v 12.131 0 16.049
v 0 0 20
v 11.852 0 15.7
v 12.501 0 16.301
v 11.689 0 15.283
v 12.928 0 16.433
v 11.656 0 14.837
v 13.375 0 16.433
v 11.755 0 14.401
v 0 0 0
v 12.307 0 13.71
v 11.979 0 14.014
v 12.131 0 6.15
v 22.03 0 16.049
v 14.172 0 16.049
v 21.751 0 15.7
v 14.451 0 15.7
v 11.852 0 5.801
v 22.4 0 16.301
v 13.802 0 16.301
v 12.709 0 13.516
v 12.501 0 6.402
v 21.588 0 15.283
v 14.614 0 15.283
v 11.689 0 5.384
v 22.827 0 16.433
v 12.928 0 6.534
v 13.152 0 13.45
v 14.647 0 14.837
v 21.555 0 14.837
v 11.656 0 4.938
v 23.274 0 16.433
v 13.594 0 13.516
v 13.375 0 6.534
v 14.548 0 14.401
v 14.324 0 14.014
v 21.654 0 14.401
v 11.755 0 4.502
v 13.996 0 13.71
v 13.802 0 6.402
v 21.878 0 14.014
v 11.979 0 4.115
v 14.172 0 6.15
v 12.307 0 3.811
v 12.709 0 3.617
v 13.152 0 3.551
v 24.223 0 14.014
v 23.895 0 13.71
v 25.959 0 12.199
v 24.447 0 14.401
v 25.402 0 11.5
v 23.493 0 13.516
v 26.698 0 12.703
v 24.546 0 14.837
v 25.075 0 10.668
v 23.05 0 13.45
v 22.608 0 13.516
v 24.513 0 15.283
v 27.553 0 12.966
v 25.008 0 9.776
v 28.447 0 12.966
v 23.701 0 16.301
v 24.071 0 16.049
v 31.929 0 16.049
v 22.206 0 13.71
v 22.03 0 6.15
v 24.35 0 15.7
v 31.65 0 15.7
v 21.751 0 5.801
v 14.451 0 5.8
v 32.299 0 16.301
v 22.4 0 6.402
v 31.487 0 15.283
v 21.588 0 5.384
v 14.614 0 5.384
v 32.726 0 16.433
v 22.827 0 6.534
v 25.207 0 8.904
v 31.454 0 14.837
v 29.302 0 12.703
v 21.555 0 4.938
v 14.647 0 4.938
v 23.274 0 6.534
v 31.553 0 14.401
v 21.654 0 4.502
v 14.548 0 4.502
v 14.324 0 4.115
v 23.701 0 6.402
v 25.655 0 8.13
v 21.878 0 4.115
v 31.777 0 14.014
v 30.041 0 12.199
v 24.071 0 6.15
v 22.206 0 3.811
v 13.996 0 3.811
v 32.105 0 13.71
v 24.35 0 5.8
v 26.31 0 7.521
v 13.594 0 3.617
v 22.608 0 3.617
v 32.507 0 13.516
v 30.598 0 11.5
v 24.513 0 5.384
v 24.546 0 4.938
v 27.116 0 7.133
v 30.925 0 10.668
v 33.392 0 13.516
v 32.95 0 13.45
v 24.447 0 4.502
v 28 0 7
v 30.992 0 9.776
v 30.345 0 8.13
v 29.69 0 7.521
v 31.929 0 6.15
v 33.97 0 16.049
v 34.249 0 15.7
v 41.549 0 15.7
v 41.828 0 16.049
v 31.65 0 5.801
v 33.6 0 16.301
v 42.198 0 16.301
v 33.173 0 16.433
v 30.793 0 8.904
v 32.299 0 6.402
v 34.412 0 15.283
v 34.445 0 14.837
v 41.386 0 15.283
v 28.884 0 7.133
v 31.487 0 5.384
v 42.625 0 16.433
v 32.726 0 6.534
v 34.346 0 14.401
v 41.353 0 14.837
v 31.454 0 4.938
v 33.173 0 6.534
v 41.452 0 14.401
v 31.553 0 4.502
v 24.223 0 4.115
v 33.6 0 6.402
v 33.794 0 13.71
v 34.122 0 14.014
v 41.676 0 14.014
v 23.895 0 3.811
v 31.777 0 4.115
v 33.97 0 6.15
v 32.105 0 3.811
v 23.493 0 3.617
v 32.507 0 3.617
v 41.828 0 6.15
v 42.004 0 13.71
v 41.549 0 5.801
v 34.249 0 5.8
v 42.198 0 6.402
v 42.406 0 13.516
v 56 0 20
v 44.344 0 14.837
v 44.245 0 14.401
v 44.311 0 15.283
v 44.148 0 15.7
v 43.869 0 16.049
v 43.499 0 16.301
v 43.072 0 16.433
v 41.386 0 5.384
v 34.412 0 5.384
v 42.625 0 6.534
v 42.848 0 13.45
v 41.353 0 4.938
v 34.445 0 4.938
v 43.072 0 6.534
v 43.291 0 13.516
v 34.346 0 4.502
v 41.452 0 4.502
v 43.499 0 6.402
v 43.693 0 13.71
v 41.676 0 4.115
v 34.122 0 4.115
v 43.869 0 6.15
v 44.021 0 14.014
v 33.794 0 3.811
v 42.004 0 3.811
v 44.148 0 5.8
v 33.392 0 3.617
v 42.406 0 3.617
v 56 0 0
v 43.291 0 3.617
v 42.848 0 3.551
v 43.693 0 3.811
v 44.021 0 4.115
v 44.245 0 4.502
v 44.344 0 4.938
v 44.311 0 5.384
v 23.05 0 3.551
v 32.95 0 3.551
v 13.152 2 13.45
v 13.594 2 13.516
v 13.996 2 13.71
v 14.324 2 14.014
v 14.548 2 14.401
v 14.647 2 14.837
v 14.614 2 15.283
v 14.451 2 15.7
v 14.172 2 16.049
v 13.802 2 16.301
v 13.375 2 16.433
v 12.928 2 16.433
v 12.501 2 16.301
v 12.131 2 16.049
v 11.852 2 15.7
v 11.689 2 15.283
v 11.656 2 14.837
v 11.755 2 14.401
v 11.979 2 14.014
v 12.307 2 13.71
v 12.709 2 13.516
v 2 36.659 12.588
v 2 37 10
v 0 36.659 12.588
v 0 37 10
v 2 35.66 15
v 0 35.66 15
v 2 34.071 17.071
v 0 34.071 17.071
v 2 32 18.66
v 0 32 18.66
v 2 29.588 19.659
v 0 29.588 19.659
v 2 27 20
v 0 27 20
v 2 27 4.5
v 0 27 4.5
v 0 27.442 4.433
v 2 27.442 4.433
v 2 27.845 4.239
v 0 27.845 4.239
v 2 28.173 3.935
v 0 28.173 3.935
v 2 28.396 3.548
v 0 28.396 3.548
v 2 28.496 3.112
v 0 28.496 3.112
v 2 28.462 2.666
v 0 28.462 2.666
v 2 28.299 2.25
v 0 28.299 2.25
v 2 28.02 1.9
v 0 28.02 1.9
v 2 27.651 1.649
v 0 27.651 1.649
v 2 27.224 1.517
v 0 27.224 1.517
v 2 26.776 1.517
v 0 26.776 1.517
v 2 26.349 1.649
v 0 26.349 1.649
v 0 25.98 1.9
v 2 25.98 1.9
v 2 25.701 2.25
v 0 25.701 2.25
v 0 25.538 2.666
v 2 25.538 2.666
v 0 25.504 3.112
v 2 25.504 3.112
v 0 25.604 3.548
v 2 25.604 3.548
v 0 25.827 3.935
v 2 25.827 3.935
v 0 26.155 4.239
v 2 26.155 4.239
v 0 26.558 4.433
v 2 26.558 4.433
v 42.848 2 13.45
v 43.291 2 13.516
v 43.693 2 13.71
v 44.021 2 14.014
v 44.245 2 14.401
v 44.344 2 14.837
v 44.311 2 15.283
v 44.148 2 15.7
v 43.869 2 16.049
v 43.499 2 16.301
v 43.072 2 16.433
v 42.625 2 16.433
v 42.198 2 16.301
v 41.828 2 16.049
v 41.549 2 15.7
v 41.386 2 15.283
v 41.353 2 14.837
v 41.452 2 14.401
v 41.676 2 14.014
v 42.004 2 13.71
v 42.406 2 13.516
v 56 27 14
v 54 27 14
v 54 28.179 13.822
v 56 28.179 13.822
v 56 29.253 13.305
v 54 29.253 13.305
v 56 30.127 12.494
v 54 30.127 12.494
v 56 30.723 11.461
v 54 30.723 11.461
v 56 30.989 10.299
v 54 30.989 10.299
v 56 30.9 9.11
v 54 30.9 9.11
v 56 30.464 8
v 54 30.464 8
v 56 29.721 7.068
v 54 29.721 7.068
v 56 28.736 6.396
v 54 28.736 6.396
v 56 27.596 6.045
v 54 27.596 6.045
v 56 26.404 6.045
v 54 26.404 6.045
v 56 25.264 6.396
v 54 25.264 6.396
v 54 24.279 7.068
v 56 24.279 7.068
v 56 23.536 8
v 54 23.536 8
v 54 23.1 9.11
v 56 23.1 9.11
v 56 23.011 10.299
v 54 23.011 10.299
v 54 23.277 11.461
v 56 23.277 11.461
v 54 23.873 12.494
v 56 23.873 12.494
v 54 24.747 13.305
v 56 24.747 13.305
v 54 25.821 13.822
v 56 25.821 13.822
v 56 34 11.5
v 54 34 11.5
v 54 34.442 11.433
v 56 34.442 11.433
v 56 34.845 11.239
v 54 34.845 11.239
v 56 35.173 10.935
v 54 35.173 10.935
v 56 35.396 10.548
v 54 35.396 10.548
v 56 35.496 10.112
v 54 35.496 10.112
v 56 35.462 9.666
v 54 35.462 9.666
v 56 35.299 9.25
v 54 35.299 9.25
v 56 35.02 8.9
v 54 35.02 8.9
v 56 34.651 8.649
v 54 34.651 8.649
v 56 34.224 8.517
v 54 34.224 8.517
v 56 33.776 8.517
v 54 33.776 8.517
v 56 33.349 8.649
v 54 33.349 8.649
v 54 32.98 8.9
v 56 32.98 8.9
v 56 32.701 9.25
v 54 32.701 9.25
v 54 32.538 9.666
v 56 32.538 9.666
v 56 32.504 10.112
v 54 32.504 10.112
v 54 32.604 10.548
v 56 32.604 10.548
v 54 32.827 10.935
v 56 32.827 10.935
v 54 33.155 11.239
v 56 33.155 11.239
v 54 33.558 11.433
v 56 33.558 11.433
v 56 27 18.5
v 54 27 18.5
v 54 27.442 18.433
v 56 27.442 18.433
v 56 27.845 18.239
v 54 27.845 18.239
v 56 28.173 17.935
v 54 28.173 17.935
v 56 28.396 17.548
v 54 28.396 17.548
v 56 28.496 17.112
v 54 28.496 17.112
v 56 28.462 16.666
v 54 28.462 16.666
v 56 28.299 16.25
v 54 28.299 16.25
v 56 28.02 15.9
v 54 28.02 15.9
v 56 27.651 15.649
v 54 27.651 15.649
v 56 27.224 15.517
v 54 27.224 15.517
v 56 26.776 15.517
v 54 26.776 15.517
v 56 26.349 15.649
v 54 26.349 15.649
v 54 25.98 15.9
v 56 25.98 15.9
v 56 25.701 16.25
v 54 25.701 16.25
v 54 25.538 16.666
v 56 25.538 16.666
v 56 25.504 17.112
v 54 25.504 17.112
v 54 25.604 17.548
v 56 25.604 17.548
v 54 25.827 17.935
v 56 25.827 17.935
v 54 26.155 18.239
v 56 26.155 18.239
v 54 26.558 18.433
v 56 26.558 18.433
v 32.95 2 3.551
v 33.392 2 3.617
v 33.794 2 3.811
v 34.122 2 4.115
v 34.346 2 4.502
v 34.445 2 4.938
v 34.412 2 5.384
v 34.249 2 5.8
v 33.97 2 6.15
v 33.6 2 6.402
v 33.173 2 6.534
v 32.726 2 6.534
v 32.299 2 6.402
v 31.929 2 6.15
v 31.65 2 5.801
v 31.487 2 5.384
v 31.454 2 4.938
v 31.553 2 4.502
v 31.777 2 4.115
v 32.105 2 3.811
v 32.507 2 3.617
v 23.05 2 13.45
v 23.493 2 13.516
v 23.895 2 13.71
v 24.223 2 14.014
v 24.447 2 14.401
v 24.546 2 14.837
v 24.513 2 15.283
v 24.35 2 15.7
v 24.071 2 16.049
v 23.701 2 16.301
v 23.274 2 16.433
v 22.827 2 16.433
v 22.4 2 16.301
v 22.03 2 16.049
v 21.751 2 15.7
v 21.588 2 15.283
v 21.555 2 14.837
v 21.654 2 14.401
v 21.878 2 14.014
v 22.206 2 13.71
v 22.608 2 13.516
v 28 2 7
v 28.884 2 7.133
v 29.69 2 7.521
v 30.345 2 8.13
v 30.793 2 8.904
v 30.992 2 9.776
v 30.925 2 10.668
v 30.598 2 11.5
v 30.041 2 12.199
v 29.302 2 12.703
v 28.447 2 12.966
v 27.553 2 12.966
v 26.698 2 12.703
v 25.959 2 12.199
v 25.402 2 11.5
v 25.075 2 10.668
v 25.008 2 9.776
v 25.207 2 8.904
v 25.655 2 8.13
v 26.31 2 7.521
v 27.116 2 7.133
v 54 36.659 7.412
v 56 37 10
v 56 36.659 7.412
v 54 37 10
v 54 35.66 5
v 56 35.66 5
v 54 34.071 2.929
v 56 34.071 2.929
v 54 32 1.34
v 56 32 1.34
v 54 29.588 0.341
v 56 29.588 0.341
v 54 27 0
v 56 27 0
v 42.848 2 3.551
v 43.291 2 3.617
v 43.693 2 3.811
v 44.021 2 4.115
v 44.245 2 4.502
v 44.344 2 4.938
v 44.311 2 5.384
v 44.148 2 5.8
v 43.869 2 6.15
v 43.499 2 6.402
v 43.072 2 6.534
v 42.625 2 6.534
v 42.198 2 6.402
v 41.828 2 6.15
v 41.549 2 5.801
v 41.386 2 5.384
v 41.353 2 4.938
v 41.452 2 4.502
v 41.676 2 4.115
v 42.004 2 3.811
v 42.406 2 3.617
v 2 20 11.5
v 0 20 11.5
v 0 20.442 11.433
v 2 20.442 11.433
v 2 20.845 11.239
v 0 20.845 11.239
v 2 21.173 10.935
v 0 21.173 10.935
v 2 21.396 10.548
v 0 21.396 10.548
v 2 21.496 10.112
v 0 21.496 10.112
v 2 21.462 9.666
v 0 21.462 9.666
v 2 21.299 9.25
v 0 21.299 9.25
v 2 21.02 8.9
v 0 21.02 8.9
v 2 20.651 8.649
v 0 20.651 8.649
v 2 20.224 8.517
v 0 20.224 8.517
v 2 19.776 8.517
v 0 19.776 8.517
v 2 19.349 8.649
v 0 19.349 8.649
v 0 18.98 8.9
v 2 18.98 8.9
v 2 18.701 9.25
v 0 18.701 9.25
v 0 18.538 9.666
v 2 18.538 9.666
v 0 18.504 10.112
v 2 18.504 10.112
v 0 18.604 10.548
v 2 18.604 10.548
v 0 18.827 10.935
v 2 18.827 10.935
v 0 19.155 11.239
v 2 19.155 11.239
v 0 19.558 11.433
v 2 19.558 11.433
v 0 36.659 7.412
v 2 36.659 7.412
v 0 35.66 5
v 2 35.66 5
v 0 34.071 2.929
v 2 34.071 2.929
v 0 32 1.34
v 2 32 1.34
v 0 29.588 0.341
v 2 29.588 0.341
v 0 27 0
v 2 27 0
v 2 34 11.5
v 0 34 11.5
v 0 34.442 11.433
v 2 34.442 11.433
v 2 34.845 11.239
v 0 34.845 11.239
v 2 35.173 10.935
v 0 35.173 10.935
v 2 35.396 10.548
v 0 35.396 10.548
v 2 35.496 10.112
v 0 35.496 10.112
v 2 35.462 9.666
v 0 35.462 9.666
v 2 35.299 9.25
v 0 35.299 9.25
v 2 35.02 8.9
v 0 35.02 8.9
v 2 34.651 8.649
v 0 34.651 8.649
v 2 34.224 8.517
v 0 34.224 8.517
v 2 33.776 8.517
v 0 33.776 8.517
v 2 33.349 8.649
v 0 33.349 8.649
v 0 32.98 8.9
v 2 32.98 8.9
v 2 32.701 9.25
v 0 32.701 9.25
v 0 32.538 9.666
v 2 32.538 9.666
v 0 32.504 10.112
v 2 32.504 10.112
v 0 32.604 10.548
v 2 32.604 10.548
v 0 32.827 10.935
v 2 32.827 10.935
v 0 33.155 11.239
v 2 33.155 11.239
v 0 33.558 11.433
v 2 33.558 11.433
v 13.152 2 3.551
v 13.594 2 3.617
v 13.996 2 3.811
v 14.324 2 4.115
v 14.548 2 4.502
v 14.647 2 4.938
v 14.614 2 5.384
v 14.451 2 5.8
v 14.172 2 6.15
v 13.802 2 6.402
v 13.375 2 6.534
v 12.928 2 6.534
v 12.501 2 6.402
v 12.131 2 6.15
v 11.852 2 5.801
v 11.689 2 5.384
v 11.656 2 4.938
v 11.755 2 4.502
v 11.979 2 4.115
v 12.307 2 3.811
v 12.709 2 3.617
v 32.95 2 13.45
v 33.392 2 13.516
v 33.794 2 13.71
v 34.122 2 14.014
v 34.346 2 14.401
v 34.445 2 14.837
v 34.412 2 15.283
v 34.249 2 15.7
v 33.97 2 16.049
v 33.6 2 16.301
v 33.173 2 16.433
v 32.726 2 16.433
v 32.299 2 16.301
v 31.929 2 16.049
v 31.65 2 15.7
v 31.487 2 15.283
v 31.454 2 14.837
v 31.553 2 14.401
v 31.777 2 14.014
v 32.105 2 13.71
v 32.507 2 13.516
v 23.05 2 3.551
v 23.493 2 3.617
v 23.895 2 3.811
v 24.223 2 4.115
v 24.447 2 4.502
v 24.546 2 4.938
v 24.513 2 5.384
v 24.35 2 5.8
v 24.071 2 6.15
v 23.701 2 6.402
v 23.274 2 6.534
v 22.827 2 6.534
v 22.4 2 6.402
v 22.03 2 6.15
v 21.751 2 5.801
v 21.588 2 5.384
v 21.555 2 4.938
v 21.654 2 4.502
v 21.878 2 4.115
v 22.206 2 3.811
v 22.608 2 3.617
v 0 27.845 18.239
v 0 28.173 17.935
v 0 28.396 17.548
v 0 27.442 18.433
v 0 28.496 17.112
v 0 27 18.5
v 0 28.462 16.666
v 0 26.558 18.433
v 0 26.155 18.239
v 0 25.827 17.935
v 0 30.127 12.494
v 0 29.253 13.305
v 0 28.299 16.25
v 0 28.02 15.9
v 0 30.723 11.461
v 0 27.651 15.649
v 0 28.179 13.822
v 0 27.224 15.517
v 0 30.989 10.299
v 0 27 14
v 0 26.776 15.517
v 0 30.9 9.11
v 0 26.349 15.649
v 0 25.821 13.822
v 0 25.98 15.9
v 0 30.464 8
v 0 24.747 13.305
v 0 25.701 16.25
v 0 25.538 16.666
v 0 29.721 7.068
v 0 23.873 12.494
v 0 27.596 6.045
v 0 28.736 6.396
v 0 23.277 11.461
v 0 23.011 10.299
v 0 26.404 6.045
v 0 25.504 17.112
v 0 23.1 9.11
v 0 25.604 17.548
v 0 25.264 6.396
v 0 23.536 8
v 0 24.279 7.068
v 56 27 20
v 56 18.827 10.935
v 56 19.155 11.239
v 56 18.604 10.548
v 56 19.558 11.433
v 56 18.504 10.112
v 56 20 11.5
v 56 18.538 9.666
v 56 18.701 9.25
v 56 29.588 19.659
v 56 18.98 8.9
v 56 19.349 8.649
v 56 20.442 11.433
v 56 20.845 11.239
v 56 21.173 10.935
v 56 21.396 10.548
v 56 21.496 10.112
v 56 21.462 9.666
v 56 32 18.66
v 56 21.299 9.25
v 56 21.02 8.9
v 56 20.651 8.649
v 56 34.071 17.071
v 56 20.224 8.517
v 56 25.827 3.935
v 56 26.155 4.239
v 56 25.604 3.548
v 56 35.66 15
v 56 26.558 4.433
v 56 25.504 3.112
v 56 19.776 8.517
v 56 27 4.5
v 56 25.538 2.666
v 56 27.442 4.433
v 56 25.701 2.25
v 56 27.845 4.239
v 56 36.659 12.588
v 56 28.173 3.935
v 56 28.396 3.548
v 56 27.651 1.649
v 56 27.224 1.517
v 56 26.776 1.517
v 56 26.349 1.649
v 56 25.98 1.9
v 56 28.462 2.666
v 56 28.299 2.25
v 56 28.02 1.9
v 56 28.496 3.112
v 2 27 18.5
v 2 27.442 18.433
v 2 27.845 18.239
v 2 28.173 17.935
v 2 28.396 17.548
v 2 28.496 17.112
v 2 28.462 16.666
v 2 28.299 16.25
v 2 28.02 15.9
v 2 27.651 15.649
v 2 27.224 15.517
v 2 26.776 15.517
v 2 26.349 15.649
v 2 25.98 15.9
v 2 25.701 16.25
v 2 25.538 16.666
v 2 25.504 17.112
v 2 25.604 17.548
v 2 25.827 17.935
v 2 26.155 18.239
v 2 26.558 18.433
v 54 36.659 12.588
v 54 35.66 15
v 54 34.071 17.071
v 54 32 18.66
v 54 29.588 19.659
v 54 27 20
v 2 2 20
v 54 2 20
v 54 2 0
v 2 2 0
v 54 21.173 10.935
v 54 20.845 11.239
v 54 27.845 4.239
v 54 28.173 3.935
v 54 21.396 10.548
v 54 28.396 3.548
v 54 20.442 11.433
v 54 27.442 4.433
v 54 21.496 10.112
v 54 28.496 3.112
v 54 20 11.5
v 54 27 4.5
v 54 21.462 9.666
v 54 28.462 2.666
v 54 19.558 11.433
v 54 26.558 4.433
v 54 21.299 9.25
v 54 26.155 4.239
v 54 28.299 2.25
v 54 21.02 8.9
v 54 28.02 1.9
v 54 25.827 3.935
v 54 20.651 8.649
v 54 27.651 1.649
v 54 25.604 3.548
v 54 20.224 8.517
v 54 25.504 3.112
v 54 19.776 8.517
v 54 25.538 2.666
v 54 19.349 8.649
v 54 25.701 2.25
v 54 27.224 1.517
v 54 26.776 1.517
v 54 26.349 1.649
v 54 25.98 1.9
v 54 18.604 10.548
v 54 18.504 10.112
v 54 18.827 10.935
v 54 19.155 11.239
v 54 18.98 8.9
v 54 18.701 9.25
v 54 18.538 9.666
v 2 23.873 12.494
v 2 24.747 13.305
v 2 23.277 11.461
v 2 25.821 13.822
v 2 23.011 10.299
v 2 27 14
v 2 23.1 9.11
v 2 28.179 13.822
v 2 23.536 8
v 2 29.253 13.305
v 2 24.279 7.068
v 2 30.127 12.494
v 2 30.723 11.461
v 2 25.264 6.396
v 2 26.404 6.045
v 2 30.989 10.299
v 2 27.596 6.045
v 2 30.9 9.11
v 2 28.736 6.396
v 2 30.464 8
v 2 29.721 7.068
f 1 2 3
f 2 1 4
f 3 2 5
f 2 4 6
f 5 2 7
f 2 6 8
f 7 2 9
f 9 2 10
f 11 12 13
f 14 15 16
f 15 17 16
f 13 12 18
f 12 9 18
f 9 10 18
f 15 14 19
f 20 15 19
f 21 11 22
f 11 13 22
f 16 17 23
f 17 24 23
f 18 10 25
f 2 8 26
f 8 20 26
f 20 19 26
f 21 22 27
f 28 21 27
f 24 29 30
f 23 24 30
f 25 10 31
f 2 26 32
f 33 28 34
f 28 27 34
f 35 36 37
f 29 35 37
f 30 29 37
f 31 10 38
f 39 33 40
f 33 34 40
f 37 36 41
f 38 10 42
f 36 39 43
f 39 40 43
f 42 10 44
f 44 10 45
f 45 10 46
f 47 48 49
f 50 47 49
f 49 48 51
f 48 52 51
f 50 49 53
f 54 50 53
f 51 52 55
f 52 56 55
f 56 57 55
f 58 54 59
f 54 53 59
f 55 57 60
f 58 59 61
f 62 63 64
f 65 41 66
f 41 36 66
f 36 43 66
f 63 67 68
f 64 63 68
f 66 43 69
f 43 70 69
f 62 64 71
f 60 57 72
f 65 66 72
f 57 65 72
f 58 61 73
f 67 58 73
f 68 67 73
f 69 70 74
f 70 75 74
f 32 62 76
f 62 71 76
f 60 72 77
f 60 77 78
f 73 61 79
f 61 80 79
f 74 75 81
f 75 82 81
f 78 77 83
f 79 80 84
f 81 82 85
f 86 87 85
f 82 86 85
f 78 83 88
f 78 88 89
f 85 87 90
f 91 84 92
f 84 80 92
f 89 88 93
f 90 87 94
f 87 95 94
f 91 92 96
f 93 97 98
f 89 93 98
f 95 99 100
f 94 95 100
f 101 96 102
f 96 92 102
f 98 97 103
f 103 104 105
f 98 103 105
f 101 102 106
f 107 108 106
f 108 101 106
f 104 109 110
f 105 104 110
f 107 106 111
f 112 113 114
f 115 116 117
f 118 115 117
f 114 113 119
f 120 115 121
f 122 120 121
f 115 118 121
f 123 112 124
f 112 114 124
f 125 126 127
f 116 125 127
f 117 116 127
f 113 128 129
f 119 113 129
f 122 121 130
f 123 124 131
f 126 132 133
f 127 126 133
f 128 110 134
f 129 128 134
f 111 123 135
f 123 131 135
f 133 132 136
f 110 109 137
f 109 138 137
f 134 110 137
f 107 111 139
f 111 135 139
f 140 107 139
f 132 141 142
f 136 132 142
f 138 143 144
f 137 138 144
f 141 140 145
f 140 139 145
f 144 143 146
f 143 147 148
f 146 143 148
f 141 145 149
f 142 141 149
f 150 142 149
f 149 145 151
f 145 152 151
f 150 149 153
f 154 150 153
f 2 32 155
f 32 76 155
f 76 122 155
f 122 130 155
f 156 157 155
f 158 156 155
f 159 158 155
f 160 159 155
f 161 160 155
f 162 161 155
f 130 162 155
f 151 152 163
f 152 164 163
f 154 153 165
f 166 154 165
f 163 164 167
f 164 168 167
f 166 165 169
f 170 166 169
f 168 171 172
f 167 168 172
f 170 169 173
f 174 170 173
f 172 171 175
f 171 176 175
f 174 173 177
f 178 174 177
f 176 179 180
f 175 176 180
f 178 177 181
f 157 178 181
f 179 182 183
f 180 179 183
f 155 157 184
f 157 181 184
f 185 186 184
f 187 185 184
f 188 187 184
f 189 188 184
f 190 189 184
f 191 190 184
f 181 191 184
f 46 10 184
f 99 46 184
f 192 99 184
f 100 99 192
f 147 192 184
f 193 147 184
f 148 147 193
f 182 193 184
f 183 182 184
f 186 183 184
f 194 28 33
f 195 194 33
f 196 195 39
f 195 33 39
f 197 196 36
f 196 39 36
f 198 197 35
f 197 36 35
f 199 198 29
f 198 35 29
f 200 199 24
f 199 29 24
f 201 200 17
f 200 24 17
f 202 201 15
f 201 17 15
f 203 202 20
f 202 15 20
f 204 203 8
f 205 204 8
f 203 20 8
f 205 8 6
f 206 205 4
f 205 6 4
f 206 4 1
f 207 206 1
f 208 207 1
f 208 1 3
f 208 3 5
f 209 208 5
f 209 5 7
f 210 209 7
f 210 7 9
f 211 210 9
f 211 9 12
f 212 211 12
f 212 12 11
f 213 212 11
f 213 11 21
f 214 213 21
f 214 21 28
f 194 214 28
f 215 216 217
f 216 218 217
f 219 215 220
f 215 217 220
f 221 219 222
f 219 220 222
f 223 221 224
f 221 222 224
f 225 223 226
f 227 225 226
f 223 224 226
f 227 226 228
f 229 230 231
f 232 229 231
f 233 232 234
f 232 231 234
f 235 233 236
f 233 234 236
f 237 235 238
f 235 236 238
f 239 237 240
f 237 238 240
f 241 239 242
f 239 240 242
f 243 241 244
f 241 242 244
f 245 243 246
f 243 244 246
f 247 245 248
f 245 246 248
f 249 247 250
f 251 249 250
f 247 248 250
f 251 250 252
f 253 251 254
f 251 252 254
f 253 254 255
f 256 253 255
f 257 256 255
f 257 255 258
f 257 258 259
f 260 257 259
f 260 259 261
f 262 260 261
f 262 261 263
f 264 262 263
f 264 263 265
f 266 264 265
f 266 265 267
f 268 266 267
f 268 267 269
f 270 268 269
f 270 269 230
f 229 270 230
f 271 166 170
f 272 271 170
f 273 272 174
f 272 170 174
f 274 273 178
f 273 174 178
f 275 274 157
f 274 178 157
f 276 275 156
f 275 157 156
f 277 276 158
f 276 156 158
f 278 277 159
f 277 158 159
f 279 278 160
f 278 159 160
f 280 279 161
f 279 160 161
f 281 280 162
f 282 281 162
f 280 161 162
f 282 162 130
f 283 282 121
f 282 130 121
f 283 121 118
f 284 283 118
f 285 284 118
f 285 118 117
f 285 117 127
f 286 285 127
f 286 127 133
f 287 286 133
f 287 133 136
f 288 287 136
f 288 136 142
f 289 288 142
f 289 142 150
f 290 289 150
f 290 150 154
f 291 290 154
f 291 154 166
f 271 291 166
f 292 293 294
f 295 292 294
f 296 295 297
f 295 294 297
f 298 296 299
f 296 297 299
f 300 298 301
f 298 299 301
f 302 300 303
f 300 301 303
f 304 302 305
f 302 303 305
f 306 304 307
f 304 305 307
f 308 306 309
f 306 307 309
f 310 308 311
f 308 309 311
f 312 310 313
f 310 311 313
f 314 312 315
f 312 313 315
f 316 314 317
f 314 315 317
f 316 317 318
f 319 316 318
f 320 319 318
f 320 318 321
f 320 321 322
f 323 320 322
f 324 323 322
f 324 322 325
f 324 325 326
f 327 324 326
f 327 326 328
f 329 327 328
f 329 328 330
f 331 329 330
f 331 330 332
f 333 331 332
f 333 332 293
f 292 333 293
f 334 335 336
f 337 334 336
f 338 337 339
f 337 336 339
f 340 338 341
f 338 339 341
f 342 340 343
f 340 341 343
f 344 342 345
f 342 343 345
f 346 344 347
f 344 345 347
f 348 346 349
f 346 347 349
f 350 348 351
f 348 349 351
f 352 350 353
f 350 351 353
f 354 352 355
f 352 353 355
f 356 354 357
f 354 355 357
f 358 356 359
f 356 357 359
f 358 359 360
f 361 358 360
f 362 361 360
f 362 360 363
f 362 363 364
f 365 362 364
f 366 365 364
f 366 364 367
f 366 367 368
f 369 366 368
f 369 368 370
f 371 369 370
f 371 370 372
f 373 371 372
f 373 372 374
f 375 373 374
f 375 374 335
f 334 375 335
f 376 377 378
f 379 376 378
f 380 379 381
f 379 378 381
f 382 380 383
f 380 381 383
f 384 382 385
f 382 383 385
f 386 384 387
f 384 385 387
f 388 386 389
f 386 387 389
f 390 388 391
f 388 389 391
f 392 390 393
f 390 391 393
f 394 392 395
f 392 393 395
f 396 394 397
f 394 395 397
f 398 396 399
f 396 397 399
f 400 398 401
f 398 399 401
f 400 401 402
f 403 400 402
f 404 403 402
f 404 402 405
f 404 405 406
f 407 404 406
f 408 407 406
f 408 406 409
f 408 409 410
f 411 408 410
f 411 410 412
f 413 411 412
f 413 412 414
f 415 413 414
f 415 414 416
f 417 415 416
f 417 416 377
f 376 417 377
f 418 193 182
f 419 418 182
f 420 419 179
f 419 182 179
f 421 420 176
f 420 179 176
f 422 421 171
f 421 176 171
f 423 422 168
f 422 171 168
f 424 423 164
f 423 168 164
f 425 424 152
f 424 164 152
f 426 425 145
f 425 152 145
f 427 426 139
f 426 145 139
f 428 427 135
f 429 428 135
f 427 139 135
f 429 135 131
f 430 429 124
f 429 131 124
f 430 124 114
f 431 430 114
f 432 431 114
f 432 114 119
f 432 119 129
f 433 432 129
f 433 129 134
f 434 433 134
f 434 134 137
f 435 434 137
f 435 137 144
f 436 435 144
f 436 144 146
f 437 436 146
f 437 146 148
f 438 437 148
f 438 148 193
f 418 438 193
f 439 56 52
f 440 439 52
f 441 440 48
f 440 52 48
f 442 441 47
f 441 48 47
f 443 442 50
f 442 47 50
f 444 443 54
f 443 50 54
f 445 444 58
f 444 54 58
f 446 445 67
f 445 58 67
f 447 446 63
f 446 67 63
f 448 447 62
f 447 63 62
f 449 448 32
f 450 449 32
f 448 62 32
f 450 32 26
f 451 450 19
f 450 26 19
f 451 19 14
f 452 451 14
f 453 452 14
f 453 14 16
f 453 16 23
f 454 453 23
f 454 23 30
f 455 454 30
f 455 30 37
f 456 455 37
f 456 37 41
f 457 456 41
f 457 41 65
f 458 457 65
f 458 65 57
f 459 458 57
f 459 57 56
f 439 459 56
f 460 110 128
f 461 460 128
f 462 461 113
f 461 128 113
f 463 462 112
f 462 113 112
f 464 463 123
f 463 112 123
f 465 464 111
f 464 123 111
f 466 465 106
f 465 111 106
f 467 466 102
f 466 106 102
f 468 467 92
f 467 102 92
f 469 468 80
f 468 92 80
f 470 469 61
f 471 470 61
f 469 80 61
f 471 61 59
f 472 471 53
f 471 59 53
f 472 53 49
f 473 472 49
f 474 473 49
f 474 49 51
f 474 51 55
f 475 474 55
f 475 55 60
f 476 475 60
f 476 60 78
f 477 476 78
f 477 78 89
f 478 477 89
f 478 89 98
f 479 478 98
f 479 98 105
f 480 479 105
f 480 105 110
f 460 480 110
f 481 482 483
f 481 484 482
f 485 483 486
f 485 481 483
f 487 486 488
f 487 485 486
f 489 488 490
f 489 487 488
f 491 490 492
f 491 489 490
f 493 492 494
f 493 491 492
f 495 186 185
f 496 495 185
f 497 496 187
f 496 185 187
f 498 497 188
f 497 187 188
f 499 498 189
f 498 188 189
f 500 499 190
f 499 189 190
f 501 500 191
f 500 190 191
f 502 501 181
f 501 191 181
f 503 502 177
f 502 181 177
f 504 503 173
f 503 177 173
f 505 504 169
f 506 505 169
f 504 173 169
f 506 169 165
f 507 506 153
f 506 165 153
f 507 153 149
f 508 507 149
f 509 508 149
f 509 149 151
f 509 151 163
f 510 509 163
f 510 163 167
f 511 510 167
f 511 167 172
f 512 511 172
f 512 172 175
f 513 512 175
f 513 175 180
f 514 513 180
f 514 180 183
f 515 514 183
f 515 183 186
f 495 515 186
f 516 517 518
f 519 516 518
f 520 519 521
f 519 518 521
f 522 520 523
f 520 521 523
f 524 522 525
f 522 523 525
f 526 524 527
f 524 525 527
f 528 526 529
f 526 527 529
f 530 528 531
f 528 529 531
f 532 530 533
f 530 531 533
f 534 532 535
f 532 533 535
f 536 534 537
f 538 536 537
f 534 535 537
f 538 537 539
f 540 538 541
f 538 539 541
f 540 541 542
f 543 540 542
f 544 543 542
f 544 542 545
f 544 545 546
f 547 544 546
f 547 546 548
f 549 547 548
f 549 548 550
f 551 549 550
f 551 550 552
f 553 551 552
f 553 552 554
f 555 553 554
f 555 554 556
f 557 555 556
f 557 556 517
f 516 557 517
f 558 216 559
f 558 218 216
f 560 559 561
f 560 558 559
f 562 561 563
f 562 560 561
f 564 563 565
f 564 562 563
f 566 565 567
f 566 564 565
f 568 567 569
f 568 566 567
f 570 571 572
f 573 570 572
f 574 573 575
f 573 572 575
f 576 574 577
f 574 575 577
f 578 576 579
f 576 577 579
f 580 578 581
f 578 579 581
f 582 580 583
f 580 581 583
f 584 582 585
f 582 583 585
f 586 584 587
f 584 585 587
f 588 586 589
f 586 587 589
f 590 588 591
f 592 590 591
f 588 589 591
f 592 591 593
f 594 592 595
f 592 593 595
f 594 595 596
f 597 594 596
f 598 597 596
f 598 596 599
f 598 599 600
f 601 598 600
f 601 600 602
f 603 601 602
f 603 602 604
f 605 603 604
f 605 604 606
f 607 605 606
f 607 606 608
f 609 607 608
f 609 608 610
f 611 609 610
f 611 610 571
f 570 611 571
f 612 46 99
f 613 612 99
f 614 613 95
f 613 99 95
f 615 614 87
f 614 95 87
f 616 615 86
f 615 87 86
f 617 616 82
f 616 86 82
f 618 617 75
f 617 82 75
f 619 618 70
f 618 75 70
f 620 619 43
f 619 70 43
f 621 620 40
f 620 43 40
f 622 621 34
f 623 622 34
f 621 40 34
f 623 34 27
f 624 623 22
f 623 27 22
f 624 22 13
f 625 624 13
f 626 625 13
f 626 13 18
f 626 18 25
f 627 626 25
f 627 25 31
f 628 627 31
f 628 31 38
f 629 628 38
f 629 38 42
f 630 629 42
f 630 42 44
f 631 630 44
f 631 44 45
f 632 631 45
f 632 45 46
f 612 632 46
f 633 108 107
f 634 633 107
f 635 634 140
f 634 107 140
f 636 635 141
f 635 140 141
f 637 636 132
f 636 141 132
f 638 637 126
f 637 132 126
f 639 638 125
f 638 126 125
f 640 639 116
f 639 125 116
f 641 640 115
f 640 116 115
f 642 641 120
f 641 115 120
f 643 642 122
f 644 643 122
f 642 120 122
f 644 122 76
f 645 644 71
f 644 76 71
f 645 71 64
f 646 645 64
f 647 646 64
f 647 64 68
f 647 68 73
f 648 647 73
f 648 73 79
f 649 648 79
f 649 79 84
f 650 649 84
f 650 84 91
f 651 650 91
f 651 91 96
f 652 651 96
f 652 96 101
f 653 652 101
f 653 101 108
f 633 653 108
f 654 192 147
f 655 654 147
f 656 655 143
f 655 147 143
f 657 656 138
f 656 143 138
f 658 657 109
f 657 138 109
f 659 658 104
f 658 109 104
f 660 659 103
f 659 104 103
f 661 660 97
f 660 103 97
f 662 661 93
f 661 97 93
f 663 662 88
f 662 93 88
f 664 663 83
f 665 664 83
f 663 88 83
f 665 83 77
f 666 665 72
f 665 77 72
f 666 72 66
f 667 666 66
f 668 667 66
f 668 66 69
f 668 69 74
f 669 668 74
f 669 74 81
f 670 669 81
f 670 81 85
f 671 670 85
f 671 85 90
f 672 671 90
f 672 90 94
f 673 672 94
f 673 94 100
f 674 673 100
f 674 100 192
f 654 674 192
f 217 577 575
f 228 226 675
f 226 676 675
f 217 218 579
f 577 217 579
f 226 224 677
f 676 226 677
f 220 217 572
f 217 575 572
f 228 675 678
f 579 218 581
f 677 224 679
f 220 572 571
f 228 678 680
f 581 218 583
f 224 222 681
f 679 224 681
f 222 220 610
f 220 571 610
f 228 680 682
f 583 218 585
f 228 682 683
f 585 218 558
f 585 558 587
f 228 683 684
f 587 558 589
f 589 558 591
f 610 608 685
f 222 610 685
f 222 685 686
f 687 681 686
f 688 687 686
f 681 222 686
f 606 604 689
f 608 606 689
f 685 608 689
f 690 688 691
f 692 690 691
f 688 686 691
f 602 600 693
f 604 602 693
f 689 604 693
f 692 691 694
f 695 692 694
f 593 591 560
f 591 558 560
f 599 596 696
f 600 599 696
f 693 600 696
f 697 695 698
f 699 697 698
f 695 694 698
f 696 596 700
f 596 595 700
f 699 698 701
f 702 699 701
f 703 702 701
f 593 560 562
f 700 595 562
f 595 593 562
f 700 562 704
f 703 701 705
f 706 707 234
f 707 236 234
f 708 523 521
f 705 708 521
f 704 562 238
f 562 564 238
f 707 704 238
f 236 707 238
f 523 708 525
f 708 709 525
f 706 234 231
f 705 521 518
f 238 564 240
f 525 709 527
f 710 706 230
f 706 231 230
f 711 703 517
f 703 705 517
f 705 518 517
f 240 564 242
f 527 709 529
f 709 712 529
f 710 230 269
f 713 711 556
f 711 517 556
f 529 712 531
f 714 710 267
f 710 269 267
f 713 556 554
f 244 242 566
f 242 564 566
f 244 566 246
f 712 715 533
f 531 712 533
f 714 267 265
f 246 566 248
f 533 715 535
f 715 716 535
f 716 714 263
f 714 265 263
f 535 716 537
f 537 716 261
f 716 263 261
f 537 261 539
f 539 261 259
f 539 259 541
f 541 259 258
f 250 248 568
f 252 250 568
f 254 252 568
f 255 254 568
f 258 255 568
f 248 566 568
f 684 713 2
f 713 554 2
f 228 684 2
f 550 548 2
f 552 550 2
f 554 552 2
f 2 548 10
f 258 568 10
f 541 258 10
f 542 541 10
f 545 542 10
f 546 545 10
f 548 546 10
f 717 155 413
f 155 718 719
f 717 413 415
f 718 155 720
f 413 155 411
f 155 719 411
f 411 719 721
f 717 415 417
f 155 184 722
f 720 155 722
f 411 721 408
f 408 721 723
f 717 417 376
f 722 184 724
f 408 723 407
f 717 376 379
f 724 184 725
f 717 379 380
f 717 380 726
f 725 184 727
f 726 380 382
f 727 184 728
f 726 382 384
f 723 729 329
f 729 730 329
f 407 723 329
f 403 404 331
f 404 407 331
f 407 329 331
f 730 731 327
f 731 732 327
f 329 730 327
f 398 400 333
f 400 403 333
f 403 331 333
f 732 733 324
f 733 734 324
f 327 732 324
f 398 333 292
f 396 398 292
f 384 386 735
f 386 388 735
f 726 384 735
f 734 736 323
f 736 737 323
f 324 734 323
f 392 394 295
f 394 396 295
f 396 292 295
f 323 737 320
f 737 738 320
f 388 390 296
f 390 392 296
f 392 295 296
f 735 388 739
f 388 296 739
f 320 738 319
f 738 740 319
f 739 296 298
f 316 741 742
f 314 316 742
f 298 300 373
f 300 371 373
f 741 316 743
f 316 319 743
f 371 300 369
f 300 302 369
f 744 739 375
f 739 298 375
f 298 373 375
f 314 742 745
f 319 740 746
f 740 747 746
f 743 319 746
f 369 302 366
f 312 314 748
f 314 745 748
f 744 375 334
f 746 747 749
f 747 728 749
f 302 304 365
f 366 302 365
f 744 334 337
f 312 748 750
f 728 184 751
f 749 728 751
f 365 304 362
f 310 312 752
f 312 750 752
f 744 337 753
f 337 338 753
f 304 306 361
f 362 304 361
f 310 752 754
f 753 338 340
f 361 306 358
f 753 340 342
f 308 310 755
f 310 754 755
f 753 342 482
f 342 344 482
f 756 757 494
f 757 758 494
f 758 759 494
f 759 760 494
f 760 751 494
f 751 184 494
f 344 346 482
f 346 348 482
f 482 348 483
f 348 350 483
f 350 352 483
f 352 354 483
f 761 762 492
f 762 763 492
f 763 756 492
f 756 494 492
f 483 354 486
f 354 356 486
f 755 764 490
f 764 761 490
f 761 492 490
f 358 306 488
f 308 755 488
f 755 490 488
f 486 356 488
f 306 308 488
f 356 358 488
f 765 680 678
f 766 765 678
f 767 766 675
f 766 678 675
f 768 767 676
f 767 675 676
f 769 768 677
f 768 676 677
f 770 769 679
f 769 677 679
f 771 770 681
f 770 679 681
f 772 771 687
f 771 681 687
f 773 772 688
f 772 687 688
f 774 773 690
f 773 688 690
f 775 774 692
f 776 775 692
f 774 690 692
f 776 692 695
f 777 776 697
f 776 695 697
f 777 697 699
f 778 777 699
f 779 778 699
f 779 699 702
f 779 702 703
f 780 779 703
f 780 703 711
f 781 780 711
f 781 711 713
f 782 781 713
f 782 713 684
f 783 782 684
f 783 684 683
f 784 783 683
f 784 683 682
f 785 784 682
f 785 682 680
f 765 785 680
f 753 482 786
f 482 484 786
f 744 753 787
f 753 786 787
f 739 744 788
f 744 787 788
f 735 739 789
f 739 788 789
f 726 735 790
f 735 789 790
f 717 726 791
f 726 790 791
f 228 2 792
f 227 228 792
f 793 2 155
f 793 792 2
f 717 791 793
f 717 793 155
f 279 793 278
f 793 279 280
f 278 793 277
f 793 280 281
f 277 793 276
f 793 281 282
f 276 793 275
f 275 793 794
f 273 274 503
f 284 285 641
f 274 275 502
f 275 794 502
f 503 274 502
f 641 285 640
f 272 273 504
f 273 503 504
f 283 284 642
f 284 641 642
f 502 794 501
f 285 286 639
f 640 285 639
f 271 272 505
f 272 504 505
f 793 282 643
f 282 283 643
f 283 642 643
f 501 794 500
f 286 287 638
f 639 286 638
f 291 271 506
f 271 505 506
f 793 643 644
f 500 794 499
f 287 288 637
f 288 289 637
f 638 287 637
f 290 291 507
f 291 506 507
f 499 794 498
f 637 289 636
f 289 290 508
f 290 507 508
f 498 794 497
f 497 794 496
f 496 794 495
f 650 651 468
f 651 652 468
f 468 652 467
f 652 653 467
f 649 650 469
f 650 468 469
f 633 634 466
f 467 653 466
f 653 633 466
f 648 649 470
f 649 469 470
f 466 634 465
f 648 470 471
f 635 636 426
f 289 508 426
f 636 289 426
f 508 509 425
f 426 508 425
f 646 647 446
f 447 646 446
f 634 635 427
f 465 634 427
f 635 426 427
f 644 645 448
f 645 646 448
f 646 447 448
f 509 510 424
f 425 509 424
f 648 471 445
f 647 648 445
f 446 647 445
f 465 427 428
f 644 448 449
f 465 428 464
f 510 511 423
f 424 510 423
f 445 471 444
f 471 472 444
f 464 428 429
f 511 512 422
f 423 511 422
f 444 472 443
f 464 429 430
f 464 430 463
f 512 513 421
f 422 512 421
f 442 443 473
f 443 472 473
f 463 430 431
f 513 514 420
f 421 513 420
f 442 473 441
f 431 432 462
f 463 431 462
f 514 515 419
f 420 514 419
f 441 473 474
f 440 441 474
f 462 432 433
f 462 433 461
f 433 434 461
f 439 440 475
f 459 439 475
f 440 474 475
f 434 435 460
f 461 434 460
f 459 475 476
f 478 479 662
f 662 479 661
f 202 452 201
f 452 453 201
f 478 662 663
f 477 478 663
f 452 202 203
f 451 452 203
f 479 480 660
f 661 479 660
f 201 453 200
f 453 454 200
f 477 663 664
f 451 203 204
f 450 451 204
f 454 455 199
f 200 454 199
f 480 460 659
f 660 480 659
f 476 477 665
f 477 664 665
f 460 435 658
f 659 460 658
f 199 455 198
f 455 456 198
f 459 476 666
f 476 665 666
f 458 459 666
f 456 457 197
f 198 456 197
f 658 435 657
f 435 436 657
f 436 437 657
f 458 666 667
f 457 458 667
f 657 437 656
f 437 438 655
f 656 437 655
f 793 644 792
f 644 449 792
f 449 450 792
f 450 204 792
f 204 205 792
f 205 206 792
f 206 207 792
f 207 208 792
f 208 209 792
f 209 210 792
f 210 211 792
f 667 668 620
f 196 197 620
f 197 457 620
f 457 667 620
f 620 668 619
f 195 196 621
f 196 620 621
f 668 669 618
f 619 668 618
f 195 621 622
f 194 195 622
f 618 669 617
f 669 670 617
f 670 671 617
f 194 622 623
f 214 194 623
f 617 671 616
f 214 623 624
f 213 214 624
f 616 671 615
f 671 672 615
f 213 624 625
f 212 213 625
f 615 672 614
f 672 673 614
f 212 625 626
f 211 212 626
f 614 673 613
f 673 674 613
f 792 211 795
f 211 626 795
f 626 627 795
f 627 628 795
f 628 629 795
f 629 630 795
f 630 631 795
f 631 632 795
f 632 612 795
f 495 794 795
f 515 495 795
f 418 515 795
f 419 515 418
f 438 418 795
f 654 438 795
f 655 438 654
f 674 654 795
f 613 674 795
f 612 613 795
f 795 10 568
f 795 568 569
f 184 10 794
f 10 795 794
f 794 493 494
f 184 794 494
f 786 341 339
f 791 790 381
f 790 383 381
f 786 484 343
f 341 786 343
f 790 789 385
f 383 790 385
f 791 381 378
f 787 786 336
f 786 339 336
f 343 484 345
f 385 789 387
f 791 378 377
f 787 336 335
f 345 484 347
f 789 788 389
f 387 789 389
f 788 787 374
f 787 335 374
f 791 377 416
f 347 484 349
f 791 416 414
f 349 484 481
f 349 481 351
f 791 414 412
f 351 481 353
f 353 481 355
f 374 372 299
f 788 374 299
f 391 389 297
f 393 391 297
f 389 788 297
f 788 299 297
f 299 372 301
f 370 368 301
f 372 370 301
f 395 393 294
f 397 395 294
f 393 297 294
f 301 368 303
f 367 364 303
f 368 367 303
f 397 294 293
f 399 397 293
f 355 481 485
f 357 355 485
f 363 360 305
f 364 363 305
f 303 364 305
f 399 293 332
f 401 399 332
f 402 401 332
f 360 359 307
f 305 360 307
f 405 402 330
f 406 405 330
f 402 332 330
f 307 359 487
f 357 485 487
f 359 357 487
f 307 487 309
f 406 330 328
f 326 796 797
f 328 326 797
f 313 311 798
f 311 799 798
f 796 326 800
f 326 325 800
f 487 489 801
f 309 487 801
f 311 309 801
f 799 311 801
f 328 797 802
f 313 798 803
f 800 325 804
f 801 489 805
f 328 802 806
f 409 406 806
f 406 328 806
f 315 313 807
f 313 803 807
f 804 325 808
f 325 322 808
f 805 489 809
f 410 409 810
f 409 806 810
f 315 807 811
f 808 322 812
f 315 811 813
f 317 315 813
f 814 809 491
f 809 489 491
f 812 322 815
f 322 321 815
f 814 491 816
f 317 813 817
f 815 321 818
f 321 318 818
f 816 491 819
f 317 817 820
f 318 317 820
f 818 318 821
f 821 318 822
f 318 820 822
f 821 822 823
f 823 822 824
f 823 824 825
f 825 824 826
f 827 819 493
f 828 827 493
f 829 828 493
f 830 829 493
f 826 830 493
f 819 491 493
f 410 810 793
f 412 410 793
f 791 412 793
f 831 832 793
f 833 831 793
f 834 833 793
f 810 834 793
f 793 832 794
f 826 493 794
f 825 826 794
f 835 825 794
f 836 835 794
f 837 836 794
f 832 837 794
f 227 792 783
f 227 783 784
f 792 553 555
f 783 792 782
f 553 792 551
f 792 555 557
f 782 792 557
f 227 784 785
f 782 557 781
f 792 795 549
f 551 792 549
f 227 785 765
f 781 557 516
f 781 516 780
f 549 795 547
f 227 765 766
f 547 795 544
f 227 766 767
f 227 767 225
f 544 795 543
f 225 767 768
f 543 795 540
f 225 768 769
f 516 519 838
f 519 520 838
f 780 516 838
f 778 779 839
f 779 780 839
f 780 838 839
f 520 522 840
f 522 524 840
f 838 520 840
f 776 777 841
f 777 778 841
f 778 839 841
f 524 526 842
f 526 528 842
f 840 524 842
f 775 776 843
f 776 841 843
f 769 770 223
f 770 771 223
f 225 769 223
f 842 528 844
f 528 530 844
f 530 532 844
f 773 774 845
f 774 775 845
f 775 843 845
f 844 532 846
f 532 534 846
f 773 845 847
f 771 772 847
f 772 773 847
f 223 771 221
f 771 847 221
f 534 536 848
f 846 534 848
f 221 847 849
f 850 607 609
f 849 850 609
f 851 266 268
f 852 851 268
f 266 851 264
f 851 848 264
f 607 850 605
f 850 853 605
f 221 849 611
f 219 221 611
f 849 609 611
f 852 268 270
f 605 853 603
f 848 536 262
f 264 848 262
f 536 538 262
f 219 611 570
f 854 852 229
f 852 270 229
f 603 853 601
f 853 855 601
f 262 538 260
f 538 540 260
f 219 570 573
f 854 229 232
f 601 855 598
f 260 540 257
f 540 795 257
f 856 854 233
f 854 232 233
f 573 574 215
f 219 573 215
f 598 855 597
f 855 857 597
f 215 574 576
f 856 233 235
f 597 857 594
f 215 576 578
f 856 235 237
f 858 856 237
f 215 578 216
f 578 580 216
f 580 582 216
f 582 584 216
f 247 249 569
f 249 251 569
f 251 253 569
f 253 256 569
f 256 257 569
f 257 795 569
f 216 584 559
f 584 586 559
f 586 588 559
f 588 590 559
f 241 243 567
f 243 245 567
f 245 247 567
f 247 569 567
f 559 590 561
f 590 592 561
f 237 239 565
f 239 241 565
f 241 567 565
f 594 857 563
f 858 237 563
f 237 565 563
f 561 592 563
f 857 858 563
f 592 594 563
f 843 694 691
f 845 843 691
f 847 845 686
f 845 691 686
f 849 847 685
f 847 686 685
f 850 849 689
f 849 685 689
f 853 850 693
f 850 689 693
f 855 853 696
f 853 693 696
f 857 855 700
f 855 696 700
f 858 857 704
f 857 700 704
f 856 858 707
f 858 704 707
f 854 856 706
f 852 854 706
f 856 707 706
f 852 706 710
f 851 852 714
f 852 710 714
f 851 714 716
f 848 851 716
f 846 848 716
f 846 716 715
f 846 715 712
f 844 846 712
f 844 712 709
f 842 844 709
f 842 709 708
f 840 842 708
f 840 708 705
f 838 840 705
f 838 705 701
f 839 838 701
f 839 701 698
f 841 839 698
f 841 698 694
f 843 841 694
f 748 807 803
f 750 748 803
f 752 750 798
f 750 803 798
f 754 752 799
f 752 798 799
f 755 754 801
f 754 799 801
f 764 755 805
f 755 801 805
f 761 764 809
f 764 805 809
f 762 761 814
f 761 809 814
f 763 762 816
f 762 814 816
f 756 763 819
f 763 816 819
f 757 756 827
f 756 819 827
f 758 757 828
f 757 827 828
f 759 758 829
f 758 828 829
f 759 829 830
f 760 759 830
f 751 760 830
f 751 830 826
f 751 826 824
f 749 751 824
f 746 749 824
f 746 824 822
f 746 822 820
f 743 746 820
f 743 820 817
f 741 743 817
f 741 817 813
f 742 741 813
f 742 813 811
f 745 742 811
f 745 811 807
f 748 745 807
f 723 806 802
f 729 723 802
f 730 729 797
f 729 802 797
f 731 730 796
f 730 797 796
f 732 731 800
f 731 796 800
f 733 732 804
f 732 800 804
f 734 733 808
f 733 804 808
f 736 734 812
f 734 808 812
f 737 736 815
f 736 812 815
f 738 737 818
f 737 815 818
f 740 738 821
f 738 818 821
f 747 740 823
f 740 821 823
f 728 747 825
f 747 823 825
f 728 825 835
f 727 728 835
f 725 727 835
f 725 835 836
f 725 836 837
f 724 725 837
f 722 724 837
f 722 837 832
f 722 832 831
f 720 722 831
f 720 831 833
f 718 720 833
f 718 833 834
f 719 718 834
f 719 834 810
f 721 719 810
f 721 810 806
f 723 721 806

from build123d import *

# Parameters (mm, degrees)
EXTRUDE_1_DEPTH     = 20
FILLET_1_R          = 10
SKETCH_2_R          = 1.5
SKETCH_2_R_2        = 4
CUT_EXTRUDE_1_DEPTH = 71.03570518
SKETCH_3_R          = 3
SKETCH_3_R_2        = 1.5
CUT_EXTRUDE_2_DEPTH = 71.03570518


with BuildPart() as part:
    # 草图1 → 拉伸-薄壁1 (new body)
    with BuildSketch(Plane.XY):
        Polygon((0, 37), (0, 0), (56, 0), (56, 37), (54, 37), (54, 2), (2, 2), (2, 37), align=None)
    extrude(amount=EXTRUDE_1_DEPTH)

    # 圆角1
    fillet_1_edges = [part.edges().sort_by_distance(p)[0] for p in [
        (55, 37, 20),
        (55, 37, 0),
        (1, 37, 0),
        (1, 37, 20),
    ]]
    fillet(fillet_1_edges, radius=FILLET_1_R - 0.0001)  # a hair under: the kernel refuses the full size

    # 草图2 → 切除-拉伸1 (cut, through all)
    with BuildSketch(Plane.ZY):
        with Locations((10, 34)):
            Circle(SKETCH_2_R)
        with Locations((17, 27)):
            Circle(SKETCH_2_R)
        with Locations((10, 20)):
            Circle(SKETCH_2_R)
        with Locations((3, 27)):
            Circle(SKETCH_2_R)
        with Locations((10, 27)):
            Circle(SKETCH_2_R_2)
    extrude(amount=-CUT_EXTRUDE_1_DEPTH, mode=Mode.SUBTRACT)

    # 草图3 → 切除-拉伸2 (cut, through all)
    with BuildSketch(Plane.XZ):
        with Locations(Location((28, 10, 0), (0, 0, 270))):
            Circle(SKETCH_3_R)
        with Locations(Location((32.9495, 14.9495, 0), (0, 0, 270))):
            Circle(SKETCH_3_R_2)
        with Locations(Location((23.0505, 14.9495, 0), (0, 0, 270))):
            Circle(SKETCH_3_R_2)
        with Locations(Location((23.0505, 5.0505, 0), (0, 0, 270))):
            Circle(SKETCH_3_R_2)
        with Locations(Location((32.9495, 5.0505, 0), (0, 0, 270))):
            Circle(SKETCH_3_R_2)
        with Locations(Location((42.8485, 14.9495, 0), (0, 0, 270))):
            Circle(SKETCH_3_R_2)
        with Locations(Location((42.8485, 5.0505, 0), (0, 0, 270))):
            Circle(SKETCH_3_R_2)
        with Locations(Location((13.1515, 5.0505, 0), (0, 0, 270))):
            Circle(SKETCH_3_R_2)
        with Locations(Location((13.1515, 14.9495, 0), (0, 0, 270))):
            Circle(SKETCH_3_R_2)
    extrude(amount=-CUT_EXTRUDE_2_DEPTH, mode=Mode.SUBTRACT)


solid = part.part
